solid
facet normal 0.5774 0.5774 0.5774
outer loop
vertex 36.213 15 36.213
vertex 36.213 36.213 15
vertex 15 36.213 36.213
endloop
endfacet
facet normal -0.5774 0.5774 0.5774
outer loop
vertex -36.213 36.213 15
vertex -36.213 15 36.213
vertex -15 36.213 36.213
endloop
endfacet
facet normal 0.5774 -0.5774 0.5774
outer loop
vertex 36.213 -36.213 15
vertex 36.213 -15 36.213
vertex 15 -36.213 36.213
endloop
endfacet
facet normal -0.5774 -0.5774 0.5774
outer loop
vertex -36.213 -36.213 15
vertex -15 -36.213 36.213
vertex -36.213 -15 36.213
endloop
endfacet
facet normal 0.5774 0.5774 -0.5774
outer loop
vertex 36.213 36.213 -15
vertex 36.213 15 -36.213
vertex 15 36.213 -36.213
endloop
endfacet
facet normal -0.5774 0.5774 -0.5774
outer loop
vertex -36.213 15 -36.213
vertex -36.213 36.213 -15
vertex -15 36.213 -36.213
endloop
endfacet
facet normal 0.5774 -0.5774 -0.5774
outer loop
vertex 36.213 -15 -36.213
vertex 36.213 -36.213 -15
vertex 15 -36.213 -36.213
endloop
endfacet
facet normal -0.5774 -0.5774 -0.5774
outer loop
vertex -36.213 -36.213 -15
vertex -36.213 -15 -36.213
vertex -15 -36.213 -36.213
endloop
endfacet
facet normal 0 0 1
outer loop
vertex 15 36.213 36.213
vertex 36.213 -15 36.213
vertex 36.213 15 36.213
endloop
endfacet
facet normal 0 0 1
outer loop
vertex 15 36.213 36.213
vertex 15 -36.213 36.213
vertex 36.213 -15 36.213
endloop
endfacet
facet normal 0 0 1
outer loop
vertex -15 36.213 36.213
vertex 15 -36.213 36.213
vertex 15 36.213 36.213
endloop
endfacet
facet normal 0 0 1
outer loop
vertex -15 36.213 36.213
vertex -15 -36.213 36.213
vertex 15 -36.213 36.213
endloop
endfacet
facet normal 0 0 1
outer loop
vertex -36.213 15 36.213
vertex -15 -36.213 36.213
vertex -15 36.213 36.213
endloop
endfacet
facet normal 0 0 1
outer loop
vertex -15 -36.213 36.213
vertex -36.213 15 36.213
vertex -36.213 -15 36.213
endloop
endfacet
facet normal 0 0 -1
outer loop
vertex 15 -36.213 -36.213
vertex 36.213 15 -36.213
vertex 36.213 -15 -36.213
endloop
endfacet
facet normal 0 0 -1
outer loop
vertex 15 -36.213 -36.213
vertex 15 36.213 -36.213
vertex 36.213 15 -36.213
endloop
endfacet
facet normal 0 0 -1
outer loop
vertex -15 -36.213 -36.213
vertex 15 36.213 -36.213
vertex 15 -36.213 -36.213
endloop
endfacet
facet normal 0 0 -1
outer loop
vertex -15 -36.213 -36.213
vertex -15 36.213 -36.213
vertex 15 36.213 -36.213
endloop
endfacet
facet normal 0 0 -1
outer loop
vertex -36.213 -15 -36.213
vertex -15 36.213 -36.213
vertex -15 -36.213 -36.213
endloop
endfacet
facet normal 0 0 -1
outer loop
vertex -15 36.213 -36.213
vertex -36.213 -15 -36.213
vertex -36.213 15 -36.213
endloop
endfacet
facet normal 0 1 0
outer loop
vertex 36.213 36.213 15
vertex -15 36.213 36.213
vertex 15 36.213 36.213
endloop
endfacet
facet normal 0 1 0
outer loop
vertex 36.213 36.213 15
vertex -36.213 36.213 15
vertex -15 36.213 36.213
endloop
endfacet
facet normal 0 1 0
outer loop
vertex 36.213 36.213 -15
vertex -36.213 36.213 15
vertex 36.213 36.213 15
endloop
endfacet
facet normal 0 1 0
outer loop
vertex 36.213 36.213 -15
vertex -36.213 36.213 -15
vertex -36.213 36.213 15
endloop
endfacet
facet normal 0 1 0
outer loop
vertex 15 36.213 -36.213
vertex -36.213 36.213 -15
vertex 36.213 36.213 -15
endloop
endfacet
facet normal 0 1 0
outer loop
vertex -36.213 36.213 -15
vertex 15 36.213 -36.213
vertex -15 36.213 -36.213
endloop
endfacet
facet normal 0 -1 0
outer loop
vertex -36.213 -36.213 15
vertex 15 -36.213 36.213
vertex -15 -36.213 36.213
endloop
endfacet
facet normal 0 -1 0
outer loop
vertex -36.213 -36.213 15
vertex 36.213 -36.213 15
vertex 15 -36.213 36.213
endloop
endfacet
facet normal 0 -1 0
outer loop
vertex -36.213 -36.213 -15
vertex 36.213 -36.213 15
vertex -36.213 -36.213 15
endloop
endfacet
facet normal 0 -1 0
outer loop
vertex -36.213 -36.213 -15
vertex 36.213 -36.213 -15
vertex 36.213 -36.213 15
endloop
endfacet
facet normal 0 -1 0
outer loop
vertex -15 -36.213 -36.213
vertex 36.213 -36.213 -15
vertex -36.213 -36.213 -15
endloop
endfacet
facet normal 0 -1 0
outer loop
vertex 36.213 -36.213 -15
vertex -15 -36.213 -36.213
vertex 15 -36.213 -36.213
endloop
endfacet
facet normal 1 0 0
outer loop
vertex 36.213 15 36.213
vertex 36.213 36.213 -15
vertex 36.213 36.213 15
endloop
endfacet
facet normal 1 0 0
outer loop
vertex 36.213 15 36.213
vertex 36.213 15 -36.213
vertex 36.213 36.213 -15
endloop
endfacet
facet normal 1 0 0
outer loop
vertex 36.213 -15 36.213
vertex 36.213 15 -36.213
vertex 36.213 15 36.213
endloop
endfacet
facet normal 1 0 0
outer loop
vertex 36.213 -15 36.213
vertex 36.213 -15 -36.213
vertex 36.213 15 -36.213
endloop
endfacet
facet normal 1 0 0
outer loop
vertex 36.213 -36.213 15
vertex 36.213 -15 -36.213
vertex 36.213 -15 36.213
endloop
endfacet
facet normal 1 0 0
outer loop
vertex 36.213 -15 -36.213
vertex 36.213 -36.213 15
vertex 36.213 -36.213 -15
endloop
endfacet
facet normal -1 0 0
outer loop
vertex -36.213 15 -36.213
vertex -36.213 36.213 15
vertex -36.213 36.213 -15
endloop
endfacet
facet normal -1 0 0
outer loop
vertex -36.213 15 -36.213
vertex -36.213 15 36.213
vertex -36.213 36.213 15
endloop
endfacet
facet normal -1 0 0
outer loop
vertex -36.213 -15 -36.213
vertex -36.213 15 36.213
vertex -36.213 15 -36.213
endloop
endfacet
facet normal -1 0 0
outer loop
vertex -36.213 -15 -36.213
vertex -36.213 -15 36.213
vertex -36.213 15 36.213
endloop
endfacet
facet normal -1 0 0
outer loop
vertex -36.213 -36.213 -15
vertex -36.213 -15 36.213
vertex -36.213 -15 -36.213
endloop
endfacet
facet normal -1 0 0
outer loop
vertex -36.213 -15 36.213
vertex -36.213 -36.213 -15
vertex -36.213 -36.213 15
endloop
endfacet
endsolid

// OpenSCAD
// Truncated Cube
// (C) @oblomobka - 2023.06
// GPL license

 /* **CUSTOMIZER VARIABLES** */
// Edge
edge = 30; //[10:100]
// Center of the solid or stand over a face
position = "Center"; //["Center", "Face"]

/* **MODULES** */      
module TruncatedCube ( edge = 30, position = "Face"){ // tC -> Conway notation
    
    // Invariants
    
    // Relations
    
    // Variables
    a = (edge+2*edge/sqrt(2))/2;
    b = edge/sqrt(2); //b represent the truncation value to obtain regular polygons. It operates on the vertex of the original(Platonic) polyhedron.
    
    // Definition of points and faces V = 24 / F = 14 ( 6 Octagons + 8 triangles )
    tCpoints = [
        // Every line define a triangle face in one octant
        [ +(a-b), +a, +a], [ +a, +(a-b), +a], [ +a, +a, +(a-b)],    // +X+Y+Z   [  0,  1,  2]
        [ -(a-b), +a, +a], [ -a, +(a-b), +a], [ -a, +a, +(a-b)],    // -X+Y+Z   [  3,  4,  5]
        [ +(a-b), -a, +a], [ +a, -(a-b), +a], [ +a, -a, +(a-b)],    // +X-Y+Z   [  6,  7,  8]
        [ -(a-b), -a, +a], [ -a, -(a-b), +a], [ -a, -a, +(a-b)],    // -X-Y+Z   [  9, 10, 11]
        [ +(a-b), +a, -a], [ +a, +(a-b), -a], [ +a, +a, -(a-b)],    // +X+Y-Z   [ 12, 13, 14]
        [ -(a-b), +a, -a], [ -a, +(a-b), -a], [ -a, +a, -(a-b)],    // -X+Y-Z   [ 15, 16, 17]
        [ +(a-b), -a, -a], [ +a, -(a-b), -a], [ +a, -a, -(a-b)],    // +X-Y-Z   [ 18, 19, 20]
        [ -(a-b), -a, -a], [ -a, -(a-b), -a], [ -a, -a, -(a-b)]     // -X-Y-Z   [ 21, 22, 23]
        ];
    
    tCfaces = [
        // Build 8 triangles. One triangle per octant
        [  0,  2,  1], [  3,  4,  5], [  6,  7,  8], [ 10,  9, 11],     // UP
        [ 12, 13, 14], [ 15, 17, 16], [ 18, 20, 19], [ 21, 22, 23],     // DOWN
        // Octagons
        [  0,  1,  7,  6,  9, 10,  4,  3], [ 12, 15, 16, 22, 21, 18, 19, 13],       // parallel XY
        [  0,  3,  5, 17, 15, 12, 14,  2], [  6,  8, 20, 18, 21, 23, 11,  9],       // parallel XZ
        [  1,  2, 14, 13, 19, 20,  8,  7], [  4, 10, 11, 23, 22, 16, 17,  5]        // parallel YZ
        ];
  
    // Polyhedron stands on xy plane centered on the center of the face or centered on the center of polyhedron
    if ( position == "Center") {
            polyhedron ( tCpoints, tCfaces);}
            
    else if ( position == "Face"){
        translate ([ 0, 0, a])
            polyhedron ( tCpoints, tCfaces);}
    }

/* **RENDERING OF SOLIDS** */
TruncatedCube ( edge = edge, position = position);
